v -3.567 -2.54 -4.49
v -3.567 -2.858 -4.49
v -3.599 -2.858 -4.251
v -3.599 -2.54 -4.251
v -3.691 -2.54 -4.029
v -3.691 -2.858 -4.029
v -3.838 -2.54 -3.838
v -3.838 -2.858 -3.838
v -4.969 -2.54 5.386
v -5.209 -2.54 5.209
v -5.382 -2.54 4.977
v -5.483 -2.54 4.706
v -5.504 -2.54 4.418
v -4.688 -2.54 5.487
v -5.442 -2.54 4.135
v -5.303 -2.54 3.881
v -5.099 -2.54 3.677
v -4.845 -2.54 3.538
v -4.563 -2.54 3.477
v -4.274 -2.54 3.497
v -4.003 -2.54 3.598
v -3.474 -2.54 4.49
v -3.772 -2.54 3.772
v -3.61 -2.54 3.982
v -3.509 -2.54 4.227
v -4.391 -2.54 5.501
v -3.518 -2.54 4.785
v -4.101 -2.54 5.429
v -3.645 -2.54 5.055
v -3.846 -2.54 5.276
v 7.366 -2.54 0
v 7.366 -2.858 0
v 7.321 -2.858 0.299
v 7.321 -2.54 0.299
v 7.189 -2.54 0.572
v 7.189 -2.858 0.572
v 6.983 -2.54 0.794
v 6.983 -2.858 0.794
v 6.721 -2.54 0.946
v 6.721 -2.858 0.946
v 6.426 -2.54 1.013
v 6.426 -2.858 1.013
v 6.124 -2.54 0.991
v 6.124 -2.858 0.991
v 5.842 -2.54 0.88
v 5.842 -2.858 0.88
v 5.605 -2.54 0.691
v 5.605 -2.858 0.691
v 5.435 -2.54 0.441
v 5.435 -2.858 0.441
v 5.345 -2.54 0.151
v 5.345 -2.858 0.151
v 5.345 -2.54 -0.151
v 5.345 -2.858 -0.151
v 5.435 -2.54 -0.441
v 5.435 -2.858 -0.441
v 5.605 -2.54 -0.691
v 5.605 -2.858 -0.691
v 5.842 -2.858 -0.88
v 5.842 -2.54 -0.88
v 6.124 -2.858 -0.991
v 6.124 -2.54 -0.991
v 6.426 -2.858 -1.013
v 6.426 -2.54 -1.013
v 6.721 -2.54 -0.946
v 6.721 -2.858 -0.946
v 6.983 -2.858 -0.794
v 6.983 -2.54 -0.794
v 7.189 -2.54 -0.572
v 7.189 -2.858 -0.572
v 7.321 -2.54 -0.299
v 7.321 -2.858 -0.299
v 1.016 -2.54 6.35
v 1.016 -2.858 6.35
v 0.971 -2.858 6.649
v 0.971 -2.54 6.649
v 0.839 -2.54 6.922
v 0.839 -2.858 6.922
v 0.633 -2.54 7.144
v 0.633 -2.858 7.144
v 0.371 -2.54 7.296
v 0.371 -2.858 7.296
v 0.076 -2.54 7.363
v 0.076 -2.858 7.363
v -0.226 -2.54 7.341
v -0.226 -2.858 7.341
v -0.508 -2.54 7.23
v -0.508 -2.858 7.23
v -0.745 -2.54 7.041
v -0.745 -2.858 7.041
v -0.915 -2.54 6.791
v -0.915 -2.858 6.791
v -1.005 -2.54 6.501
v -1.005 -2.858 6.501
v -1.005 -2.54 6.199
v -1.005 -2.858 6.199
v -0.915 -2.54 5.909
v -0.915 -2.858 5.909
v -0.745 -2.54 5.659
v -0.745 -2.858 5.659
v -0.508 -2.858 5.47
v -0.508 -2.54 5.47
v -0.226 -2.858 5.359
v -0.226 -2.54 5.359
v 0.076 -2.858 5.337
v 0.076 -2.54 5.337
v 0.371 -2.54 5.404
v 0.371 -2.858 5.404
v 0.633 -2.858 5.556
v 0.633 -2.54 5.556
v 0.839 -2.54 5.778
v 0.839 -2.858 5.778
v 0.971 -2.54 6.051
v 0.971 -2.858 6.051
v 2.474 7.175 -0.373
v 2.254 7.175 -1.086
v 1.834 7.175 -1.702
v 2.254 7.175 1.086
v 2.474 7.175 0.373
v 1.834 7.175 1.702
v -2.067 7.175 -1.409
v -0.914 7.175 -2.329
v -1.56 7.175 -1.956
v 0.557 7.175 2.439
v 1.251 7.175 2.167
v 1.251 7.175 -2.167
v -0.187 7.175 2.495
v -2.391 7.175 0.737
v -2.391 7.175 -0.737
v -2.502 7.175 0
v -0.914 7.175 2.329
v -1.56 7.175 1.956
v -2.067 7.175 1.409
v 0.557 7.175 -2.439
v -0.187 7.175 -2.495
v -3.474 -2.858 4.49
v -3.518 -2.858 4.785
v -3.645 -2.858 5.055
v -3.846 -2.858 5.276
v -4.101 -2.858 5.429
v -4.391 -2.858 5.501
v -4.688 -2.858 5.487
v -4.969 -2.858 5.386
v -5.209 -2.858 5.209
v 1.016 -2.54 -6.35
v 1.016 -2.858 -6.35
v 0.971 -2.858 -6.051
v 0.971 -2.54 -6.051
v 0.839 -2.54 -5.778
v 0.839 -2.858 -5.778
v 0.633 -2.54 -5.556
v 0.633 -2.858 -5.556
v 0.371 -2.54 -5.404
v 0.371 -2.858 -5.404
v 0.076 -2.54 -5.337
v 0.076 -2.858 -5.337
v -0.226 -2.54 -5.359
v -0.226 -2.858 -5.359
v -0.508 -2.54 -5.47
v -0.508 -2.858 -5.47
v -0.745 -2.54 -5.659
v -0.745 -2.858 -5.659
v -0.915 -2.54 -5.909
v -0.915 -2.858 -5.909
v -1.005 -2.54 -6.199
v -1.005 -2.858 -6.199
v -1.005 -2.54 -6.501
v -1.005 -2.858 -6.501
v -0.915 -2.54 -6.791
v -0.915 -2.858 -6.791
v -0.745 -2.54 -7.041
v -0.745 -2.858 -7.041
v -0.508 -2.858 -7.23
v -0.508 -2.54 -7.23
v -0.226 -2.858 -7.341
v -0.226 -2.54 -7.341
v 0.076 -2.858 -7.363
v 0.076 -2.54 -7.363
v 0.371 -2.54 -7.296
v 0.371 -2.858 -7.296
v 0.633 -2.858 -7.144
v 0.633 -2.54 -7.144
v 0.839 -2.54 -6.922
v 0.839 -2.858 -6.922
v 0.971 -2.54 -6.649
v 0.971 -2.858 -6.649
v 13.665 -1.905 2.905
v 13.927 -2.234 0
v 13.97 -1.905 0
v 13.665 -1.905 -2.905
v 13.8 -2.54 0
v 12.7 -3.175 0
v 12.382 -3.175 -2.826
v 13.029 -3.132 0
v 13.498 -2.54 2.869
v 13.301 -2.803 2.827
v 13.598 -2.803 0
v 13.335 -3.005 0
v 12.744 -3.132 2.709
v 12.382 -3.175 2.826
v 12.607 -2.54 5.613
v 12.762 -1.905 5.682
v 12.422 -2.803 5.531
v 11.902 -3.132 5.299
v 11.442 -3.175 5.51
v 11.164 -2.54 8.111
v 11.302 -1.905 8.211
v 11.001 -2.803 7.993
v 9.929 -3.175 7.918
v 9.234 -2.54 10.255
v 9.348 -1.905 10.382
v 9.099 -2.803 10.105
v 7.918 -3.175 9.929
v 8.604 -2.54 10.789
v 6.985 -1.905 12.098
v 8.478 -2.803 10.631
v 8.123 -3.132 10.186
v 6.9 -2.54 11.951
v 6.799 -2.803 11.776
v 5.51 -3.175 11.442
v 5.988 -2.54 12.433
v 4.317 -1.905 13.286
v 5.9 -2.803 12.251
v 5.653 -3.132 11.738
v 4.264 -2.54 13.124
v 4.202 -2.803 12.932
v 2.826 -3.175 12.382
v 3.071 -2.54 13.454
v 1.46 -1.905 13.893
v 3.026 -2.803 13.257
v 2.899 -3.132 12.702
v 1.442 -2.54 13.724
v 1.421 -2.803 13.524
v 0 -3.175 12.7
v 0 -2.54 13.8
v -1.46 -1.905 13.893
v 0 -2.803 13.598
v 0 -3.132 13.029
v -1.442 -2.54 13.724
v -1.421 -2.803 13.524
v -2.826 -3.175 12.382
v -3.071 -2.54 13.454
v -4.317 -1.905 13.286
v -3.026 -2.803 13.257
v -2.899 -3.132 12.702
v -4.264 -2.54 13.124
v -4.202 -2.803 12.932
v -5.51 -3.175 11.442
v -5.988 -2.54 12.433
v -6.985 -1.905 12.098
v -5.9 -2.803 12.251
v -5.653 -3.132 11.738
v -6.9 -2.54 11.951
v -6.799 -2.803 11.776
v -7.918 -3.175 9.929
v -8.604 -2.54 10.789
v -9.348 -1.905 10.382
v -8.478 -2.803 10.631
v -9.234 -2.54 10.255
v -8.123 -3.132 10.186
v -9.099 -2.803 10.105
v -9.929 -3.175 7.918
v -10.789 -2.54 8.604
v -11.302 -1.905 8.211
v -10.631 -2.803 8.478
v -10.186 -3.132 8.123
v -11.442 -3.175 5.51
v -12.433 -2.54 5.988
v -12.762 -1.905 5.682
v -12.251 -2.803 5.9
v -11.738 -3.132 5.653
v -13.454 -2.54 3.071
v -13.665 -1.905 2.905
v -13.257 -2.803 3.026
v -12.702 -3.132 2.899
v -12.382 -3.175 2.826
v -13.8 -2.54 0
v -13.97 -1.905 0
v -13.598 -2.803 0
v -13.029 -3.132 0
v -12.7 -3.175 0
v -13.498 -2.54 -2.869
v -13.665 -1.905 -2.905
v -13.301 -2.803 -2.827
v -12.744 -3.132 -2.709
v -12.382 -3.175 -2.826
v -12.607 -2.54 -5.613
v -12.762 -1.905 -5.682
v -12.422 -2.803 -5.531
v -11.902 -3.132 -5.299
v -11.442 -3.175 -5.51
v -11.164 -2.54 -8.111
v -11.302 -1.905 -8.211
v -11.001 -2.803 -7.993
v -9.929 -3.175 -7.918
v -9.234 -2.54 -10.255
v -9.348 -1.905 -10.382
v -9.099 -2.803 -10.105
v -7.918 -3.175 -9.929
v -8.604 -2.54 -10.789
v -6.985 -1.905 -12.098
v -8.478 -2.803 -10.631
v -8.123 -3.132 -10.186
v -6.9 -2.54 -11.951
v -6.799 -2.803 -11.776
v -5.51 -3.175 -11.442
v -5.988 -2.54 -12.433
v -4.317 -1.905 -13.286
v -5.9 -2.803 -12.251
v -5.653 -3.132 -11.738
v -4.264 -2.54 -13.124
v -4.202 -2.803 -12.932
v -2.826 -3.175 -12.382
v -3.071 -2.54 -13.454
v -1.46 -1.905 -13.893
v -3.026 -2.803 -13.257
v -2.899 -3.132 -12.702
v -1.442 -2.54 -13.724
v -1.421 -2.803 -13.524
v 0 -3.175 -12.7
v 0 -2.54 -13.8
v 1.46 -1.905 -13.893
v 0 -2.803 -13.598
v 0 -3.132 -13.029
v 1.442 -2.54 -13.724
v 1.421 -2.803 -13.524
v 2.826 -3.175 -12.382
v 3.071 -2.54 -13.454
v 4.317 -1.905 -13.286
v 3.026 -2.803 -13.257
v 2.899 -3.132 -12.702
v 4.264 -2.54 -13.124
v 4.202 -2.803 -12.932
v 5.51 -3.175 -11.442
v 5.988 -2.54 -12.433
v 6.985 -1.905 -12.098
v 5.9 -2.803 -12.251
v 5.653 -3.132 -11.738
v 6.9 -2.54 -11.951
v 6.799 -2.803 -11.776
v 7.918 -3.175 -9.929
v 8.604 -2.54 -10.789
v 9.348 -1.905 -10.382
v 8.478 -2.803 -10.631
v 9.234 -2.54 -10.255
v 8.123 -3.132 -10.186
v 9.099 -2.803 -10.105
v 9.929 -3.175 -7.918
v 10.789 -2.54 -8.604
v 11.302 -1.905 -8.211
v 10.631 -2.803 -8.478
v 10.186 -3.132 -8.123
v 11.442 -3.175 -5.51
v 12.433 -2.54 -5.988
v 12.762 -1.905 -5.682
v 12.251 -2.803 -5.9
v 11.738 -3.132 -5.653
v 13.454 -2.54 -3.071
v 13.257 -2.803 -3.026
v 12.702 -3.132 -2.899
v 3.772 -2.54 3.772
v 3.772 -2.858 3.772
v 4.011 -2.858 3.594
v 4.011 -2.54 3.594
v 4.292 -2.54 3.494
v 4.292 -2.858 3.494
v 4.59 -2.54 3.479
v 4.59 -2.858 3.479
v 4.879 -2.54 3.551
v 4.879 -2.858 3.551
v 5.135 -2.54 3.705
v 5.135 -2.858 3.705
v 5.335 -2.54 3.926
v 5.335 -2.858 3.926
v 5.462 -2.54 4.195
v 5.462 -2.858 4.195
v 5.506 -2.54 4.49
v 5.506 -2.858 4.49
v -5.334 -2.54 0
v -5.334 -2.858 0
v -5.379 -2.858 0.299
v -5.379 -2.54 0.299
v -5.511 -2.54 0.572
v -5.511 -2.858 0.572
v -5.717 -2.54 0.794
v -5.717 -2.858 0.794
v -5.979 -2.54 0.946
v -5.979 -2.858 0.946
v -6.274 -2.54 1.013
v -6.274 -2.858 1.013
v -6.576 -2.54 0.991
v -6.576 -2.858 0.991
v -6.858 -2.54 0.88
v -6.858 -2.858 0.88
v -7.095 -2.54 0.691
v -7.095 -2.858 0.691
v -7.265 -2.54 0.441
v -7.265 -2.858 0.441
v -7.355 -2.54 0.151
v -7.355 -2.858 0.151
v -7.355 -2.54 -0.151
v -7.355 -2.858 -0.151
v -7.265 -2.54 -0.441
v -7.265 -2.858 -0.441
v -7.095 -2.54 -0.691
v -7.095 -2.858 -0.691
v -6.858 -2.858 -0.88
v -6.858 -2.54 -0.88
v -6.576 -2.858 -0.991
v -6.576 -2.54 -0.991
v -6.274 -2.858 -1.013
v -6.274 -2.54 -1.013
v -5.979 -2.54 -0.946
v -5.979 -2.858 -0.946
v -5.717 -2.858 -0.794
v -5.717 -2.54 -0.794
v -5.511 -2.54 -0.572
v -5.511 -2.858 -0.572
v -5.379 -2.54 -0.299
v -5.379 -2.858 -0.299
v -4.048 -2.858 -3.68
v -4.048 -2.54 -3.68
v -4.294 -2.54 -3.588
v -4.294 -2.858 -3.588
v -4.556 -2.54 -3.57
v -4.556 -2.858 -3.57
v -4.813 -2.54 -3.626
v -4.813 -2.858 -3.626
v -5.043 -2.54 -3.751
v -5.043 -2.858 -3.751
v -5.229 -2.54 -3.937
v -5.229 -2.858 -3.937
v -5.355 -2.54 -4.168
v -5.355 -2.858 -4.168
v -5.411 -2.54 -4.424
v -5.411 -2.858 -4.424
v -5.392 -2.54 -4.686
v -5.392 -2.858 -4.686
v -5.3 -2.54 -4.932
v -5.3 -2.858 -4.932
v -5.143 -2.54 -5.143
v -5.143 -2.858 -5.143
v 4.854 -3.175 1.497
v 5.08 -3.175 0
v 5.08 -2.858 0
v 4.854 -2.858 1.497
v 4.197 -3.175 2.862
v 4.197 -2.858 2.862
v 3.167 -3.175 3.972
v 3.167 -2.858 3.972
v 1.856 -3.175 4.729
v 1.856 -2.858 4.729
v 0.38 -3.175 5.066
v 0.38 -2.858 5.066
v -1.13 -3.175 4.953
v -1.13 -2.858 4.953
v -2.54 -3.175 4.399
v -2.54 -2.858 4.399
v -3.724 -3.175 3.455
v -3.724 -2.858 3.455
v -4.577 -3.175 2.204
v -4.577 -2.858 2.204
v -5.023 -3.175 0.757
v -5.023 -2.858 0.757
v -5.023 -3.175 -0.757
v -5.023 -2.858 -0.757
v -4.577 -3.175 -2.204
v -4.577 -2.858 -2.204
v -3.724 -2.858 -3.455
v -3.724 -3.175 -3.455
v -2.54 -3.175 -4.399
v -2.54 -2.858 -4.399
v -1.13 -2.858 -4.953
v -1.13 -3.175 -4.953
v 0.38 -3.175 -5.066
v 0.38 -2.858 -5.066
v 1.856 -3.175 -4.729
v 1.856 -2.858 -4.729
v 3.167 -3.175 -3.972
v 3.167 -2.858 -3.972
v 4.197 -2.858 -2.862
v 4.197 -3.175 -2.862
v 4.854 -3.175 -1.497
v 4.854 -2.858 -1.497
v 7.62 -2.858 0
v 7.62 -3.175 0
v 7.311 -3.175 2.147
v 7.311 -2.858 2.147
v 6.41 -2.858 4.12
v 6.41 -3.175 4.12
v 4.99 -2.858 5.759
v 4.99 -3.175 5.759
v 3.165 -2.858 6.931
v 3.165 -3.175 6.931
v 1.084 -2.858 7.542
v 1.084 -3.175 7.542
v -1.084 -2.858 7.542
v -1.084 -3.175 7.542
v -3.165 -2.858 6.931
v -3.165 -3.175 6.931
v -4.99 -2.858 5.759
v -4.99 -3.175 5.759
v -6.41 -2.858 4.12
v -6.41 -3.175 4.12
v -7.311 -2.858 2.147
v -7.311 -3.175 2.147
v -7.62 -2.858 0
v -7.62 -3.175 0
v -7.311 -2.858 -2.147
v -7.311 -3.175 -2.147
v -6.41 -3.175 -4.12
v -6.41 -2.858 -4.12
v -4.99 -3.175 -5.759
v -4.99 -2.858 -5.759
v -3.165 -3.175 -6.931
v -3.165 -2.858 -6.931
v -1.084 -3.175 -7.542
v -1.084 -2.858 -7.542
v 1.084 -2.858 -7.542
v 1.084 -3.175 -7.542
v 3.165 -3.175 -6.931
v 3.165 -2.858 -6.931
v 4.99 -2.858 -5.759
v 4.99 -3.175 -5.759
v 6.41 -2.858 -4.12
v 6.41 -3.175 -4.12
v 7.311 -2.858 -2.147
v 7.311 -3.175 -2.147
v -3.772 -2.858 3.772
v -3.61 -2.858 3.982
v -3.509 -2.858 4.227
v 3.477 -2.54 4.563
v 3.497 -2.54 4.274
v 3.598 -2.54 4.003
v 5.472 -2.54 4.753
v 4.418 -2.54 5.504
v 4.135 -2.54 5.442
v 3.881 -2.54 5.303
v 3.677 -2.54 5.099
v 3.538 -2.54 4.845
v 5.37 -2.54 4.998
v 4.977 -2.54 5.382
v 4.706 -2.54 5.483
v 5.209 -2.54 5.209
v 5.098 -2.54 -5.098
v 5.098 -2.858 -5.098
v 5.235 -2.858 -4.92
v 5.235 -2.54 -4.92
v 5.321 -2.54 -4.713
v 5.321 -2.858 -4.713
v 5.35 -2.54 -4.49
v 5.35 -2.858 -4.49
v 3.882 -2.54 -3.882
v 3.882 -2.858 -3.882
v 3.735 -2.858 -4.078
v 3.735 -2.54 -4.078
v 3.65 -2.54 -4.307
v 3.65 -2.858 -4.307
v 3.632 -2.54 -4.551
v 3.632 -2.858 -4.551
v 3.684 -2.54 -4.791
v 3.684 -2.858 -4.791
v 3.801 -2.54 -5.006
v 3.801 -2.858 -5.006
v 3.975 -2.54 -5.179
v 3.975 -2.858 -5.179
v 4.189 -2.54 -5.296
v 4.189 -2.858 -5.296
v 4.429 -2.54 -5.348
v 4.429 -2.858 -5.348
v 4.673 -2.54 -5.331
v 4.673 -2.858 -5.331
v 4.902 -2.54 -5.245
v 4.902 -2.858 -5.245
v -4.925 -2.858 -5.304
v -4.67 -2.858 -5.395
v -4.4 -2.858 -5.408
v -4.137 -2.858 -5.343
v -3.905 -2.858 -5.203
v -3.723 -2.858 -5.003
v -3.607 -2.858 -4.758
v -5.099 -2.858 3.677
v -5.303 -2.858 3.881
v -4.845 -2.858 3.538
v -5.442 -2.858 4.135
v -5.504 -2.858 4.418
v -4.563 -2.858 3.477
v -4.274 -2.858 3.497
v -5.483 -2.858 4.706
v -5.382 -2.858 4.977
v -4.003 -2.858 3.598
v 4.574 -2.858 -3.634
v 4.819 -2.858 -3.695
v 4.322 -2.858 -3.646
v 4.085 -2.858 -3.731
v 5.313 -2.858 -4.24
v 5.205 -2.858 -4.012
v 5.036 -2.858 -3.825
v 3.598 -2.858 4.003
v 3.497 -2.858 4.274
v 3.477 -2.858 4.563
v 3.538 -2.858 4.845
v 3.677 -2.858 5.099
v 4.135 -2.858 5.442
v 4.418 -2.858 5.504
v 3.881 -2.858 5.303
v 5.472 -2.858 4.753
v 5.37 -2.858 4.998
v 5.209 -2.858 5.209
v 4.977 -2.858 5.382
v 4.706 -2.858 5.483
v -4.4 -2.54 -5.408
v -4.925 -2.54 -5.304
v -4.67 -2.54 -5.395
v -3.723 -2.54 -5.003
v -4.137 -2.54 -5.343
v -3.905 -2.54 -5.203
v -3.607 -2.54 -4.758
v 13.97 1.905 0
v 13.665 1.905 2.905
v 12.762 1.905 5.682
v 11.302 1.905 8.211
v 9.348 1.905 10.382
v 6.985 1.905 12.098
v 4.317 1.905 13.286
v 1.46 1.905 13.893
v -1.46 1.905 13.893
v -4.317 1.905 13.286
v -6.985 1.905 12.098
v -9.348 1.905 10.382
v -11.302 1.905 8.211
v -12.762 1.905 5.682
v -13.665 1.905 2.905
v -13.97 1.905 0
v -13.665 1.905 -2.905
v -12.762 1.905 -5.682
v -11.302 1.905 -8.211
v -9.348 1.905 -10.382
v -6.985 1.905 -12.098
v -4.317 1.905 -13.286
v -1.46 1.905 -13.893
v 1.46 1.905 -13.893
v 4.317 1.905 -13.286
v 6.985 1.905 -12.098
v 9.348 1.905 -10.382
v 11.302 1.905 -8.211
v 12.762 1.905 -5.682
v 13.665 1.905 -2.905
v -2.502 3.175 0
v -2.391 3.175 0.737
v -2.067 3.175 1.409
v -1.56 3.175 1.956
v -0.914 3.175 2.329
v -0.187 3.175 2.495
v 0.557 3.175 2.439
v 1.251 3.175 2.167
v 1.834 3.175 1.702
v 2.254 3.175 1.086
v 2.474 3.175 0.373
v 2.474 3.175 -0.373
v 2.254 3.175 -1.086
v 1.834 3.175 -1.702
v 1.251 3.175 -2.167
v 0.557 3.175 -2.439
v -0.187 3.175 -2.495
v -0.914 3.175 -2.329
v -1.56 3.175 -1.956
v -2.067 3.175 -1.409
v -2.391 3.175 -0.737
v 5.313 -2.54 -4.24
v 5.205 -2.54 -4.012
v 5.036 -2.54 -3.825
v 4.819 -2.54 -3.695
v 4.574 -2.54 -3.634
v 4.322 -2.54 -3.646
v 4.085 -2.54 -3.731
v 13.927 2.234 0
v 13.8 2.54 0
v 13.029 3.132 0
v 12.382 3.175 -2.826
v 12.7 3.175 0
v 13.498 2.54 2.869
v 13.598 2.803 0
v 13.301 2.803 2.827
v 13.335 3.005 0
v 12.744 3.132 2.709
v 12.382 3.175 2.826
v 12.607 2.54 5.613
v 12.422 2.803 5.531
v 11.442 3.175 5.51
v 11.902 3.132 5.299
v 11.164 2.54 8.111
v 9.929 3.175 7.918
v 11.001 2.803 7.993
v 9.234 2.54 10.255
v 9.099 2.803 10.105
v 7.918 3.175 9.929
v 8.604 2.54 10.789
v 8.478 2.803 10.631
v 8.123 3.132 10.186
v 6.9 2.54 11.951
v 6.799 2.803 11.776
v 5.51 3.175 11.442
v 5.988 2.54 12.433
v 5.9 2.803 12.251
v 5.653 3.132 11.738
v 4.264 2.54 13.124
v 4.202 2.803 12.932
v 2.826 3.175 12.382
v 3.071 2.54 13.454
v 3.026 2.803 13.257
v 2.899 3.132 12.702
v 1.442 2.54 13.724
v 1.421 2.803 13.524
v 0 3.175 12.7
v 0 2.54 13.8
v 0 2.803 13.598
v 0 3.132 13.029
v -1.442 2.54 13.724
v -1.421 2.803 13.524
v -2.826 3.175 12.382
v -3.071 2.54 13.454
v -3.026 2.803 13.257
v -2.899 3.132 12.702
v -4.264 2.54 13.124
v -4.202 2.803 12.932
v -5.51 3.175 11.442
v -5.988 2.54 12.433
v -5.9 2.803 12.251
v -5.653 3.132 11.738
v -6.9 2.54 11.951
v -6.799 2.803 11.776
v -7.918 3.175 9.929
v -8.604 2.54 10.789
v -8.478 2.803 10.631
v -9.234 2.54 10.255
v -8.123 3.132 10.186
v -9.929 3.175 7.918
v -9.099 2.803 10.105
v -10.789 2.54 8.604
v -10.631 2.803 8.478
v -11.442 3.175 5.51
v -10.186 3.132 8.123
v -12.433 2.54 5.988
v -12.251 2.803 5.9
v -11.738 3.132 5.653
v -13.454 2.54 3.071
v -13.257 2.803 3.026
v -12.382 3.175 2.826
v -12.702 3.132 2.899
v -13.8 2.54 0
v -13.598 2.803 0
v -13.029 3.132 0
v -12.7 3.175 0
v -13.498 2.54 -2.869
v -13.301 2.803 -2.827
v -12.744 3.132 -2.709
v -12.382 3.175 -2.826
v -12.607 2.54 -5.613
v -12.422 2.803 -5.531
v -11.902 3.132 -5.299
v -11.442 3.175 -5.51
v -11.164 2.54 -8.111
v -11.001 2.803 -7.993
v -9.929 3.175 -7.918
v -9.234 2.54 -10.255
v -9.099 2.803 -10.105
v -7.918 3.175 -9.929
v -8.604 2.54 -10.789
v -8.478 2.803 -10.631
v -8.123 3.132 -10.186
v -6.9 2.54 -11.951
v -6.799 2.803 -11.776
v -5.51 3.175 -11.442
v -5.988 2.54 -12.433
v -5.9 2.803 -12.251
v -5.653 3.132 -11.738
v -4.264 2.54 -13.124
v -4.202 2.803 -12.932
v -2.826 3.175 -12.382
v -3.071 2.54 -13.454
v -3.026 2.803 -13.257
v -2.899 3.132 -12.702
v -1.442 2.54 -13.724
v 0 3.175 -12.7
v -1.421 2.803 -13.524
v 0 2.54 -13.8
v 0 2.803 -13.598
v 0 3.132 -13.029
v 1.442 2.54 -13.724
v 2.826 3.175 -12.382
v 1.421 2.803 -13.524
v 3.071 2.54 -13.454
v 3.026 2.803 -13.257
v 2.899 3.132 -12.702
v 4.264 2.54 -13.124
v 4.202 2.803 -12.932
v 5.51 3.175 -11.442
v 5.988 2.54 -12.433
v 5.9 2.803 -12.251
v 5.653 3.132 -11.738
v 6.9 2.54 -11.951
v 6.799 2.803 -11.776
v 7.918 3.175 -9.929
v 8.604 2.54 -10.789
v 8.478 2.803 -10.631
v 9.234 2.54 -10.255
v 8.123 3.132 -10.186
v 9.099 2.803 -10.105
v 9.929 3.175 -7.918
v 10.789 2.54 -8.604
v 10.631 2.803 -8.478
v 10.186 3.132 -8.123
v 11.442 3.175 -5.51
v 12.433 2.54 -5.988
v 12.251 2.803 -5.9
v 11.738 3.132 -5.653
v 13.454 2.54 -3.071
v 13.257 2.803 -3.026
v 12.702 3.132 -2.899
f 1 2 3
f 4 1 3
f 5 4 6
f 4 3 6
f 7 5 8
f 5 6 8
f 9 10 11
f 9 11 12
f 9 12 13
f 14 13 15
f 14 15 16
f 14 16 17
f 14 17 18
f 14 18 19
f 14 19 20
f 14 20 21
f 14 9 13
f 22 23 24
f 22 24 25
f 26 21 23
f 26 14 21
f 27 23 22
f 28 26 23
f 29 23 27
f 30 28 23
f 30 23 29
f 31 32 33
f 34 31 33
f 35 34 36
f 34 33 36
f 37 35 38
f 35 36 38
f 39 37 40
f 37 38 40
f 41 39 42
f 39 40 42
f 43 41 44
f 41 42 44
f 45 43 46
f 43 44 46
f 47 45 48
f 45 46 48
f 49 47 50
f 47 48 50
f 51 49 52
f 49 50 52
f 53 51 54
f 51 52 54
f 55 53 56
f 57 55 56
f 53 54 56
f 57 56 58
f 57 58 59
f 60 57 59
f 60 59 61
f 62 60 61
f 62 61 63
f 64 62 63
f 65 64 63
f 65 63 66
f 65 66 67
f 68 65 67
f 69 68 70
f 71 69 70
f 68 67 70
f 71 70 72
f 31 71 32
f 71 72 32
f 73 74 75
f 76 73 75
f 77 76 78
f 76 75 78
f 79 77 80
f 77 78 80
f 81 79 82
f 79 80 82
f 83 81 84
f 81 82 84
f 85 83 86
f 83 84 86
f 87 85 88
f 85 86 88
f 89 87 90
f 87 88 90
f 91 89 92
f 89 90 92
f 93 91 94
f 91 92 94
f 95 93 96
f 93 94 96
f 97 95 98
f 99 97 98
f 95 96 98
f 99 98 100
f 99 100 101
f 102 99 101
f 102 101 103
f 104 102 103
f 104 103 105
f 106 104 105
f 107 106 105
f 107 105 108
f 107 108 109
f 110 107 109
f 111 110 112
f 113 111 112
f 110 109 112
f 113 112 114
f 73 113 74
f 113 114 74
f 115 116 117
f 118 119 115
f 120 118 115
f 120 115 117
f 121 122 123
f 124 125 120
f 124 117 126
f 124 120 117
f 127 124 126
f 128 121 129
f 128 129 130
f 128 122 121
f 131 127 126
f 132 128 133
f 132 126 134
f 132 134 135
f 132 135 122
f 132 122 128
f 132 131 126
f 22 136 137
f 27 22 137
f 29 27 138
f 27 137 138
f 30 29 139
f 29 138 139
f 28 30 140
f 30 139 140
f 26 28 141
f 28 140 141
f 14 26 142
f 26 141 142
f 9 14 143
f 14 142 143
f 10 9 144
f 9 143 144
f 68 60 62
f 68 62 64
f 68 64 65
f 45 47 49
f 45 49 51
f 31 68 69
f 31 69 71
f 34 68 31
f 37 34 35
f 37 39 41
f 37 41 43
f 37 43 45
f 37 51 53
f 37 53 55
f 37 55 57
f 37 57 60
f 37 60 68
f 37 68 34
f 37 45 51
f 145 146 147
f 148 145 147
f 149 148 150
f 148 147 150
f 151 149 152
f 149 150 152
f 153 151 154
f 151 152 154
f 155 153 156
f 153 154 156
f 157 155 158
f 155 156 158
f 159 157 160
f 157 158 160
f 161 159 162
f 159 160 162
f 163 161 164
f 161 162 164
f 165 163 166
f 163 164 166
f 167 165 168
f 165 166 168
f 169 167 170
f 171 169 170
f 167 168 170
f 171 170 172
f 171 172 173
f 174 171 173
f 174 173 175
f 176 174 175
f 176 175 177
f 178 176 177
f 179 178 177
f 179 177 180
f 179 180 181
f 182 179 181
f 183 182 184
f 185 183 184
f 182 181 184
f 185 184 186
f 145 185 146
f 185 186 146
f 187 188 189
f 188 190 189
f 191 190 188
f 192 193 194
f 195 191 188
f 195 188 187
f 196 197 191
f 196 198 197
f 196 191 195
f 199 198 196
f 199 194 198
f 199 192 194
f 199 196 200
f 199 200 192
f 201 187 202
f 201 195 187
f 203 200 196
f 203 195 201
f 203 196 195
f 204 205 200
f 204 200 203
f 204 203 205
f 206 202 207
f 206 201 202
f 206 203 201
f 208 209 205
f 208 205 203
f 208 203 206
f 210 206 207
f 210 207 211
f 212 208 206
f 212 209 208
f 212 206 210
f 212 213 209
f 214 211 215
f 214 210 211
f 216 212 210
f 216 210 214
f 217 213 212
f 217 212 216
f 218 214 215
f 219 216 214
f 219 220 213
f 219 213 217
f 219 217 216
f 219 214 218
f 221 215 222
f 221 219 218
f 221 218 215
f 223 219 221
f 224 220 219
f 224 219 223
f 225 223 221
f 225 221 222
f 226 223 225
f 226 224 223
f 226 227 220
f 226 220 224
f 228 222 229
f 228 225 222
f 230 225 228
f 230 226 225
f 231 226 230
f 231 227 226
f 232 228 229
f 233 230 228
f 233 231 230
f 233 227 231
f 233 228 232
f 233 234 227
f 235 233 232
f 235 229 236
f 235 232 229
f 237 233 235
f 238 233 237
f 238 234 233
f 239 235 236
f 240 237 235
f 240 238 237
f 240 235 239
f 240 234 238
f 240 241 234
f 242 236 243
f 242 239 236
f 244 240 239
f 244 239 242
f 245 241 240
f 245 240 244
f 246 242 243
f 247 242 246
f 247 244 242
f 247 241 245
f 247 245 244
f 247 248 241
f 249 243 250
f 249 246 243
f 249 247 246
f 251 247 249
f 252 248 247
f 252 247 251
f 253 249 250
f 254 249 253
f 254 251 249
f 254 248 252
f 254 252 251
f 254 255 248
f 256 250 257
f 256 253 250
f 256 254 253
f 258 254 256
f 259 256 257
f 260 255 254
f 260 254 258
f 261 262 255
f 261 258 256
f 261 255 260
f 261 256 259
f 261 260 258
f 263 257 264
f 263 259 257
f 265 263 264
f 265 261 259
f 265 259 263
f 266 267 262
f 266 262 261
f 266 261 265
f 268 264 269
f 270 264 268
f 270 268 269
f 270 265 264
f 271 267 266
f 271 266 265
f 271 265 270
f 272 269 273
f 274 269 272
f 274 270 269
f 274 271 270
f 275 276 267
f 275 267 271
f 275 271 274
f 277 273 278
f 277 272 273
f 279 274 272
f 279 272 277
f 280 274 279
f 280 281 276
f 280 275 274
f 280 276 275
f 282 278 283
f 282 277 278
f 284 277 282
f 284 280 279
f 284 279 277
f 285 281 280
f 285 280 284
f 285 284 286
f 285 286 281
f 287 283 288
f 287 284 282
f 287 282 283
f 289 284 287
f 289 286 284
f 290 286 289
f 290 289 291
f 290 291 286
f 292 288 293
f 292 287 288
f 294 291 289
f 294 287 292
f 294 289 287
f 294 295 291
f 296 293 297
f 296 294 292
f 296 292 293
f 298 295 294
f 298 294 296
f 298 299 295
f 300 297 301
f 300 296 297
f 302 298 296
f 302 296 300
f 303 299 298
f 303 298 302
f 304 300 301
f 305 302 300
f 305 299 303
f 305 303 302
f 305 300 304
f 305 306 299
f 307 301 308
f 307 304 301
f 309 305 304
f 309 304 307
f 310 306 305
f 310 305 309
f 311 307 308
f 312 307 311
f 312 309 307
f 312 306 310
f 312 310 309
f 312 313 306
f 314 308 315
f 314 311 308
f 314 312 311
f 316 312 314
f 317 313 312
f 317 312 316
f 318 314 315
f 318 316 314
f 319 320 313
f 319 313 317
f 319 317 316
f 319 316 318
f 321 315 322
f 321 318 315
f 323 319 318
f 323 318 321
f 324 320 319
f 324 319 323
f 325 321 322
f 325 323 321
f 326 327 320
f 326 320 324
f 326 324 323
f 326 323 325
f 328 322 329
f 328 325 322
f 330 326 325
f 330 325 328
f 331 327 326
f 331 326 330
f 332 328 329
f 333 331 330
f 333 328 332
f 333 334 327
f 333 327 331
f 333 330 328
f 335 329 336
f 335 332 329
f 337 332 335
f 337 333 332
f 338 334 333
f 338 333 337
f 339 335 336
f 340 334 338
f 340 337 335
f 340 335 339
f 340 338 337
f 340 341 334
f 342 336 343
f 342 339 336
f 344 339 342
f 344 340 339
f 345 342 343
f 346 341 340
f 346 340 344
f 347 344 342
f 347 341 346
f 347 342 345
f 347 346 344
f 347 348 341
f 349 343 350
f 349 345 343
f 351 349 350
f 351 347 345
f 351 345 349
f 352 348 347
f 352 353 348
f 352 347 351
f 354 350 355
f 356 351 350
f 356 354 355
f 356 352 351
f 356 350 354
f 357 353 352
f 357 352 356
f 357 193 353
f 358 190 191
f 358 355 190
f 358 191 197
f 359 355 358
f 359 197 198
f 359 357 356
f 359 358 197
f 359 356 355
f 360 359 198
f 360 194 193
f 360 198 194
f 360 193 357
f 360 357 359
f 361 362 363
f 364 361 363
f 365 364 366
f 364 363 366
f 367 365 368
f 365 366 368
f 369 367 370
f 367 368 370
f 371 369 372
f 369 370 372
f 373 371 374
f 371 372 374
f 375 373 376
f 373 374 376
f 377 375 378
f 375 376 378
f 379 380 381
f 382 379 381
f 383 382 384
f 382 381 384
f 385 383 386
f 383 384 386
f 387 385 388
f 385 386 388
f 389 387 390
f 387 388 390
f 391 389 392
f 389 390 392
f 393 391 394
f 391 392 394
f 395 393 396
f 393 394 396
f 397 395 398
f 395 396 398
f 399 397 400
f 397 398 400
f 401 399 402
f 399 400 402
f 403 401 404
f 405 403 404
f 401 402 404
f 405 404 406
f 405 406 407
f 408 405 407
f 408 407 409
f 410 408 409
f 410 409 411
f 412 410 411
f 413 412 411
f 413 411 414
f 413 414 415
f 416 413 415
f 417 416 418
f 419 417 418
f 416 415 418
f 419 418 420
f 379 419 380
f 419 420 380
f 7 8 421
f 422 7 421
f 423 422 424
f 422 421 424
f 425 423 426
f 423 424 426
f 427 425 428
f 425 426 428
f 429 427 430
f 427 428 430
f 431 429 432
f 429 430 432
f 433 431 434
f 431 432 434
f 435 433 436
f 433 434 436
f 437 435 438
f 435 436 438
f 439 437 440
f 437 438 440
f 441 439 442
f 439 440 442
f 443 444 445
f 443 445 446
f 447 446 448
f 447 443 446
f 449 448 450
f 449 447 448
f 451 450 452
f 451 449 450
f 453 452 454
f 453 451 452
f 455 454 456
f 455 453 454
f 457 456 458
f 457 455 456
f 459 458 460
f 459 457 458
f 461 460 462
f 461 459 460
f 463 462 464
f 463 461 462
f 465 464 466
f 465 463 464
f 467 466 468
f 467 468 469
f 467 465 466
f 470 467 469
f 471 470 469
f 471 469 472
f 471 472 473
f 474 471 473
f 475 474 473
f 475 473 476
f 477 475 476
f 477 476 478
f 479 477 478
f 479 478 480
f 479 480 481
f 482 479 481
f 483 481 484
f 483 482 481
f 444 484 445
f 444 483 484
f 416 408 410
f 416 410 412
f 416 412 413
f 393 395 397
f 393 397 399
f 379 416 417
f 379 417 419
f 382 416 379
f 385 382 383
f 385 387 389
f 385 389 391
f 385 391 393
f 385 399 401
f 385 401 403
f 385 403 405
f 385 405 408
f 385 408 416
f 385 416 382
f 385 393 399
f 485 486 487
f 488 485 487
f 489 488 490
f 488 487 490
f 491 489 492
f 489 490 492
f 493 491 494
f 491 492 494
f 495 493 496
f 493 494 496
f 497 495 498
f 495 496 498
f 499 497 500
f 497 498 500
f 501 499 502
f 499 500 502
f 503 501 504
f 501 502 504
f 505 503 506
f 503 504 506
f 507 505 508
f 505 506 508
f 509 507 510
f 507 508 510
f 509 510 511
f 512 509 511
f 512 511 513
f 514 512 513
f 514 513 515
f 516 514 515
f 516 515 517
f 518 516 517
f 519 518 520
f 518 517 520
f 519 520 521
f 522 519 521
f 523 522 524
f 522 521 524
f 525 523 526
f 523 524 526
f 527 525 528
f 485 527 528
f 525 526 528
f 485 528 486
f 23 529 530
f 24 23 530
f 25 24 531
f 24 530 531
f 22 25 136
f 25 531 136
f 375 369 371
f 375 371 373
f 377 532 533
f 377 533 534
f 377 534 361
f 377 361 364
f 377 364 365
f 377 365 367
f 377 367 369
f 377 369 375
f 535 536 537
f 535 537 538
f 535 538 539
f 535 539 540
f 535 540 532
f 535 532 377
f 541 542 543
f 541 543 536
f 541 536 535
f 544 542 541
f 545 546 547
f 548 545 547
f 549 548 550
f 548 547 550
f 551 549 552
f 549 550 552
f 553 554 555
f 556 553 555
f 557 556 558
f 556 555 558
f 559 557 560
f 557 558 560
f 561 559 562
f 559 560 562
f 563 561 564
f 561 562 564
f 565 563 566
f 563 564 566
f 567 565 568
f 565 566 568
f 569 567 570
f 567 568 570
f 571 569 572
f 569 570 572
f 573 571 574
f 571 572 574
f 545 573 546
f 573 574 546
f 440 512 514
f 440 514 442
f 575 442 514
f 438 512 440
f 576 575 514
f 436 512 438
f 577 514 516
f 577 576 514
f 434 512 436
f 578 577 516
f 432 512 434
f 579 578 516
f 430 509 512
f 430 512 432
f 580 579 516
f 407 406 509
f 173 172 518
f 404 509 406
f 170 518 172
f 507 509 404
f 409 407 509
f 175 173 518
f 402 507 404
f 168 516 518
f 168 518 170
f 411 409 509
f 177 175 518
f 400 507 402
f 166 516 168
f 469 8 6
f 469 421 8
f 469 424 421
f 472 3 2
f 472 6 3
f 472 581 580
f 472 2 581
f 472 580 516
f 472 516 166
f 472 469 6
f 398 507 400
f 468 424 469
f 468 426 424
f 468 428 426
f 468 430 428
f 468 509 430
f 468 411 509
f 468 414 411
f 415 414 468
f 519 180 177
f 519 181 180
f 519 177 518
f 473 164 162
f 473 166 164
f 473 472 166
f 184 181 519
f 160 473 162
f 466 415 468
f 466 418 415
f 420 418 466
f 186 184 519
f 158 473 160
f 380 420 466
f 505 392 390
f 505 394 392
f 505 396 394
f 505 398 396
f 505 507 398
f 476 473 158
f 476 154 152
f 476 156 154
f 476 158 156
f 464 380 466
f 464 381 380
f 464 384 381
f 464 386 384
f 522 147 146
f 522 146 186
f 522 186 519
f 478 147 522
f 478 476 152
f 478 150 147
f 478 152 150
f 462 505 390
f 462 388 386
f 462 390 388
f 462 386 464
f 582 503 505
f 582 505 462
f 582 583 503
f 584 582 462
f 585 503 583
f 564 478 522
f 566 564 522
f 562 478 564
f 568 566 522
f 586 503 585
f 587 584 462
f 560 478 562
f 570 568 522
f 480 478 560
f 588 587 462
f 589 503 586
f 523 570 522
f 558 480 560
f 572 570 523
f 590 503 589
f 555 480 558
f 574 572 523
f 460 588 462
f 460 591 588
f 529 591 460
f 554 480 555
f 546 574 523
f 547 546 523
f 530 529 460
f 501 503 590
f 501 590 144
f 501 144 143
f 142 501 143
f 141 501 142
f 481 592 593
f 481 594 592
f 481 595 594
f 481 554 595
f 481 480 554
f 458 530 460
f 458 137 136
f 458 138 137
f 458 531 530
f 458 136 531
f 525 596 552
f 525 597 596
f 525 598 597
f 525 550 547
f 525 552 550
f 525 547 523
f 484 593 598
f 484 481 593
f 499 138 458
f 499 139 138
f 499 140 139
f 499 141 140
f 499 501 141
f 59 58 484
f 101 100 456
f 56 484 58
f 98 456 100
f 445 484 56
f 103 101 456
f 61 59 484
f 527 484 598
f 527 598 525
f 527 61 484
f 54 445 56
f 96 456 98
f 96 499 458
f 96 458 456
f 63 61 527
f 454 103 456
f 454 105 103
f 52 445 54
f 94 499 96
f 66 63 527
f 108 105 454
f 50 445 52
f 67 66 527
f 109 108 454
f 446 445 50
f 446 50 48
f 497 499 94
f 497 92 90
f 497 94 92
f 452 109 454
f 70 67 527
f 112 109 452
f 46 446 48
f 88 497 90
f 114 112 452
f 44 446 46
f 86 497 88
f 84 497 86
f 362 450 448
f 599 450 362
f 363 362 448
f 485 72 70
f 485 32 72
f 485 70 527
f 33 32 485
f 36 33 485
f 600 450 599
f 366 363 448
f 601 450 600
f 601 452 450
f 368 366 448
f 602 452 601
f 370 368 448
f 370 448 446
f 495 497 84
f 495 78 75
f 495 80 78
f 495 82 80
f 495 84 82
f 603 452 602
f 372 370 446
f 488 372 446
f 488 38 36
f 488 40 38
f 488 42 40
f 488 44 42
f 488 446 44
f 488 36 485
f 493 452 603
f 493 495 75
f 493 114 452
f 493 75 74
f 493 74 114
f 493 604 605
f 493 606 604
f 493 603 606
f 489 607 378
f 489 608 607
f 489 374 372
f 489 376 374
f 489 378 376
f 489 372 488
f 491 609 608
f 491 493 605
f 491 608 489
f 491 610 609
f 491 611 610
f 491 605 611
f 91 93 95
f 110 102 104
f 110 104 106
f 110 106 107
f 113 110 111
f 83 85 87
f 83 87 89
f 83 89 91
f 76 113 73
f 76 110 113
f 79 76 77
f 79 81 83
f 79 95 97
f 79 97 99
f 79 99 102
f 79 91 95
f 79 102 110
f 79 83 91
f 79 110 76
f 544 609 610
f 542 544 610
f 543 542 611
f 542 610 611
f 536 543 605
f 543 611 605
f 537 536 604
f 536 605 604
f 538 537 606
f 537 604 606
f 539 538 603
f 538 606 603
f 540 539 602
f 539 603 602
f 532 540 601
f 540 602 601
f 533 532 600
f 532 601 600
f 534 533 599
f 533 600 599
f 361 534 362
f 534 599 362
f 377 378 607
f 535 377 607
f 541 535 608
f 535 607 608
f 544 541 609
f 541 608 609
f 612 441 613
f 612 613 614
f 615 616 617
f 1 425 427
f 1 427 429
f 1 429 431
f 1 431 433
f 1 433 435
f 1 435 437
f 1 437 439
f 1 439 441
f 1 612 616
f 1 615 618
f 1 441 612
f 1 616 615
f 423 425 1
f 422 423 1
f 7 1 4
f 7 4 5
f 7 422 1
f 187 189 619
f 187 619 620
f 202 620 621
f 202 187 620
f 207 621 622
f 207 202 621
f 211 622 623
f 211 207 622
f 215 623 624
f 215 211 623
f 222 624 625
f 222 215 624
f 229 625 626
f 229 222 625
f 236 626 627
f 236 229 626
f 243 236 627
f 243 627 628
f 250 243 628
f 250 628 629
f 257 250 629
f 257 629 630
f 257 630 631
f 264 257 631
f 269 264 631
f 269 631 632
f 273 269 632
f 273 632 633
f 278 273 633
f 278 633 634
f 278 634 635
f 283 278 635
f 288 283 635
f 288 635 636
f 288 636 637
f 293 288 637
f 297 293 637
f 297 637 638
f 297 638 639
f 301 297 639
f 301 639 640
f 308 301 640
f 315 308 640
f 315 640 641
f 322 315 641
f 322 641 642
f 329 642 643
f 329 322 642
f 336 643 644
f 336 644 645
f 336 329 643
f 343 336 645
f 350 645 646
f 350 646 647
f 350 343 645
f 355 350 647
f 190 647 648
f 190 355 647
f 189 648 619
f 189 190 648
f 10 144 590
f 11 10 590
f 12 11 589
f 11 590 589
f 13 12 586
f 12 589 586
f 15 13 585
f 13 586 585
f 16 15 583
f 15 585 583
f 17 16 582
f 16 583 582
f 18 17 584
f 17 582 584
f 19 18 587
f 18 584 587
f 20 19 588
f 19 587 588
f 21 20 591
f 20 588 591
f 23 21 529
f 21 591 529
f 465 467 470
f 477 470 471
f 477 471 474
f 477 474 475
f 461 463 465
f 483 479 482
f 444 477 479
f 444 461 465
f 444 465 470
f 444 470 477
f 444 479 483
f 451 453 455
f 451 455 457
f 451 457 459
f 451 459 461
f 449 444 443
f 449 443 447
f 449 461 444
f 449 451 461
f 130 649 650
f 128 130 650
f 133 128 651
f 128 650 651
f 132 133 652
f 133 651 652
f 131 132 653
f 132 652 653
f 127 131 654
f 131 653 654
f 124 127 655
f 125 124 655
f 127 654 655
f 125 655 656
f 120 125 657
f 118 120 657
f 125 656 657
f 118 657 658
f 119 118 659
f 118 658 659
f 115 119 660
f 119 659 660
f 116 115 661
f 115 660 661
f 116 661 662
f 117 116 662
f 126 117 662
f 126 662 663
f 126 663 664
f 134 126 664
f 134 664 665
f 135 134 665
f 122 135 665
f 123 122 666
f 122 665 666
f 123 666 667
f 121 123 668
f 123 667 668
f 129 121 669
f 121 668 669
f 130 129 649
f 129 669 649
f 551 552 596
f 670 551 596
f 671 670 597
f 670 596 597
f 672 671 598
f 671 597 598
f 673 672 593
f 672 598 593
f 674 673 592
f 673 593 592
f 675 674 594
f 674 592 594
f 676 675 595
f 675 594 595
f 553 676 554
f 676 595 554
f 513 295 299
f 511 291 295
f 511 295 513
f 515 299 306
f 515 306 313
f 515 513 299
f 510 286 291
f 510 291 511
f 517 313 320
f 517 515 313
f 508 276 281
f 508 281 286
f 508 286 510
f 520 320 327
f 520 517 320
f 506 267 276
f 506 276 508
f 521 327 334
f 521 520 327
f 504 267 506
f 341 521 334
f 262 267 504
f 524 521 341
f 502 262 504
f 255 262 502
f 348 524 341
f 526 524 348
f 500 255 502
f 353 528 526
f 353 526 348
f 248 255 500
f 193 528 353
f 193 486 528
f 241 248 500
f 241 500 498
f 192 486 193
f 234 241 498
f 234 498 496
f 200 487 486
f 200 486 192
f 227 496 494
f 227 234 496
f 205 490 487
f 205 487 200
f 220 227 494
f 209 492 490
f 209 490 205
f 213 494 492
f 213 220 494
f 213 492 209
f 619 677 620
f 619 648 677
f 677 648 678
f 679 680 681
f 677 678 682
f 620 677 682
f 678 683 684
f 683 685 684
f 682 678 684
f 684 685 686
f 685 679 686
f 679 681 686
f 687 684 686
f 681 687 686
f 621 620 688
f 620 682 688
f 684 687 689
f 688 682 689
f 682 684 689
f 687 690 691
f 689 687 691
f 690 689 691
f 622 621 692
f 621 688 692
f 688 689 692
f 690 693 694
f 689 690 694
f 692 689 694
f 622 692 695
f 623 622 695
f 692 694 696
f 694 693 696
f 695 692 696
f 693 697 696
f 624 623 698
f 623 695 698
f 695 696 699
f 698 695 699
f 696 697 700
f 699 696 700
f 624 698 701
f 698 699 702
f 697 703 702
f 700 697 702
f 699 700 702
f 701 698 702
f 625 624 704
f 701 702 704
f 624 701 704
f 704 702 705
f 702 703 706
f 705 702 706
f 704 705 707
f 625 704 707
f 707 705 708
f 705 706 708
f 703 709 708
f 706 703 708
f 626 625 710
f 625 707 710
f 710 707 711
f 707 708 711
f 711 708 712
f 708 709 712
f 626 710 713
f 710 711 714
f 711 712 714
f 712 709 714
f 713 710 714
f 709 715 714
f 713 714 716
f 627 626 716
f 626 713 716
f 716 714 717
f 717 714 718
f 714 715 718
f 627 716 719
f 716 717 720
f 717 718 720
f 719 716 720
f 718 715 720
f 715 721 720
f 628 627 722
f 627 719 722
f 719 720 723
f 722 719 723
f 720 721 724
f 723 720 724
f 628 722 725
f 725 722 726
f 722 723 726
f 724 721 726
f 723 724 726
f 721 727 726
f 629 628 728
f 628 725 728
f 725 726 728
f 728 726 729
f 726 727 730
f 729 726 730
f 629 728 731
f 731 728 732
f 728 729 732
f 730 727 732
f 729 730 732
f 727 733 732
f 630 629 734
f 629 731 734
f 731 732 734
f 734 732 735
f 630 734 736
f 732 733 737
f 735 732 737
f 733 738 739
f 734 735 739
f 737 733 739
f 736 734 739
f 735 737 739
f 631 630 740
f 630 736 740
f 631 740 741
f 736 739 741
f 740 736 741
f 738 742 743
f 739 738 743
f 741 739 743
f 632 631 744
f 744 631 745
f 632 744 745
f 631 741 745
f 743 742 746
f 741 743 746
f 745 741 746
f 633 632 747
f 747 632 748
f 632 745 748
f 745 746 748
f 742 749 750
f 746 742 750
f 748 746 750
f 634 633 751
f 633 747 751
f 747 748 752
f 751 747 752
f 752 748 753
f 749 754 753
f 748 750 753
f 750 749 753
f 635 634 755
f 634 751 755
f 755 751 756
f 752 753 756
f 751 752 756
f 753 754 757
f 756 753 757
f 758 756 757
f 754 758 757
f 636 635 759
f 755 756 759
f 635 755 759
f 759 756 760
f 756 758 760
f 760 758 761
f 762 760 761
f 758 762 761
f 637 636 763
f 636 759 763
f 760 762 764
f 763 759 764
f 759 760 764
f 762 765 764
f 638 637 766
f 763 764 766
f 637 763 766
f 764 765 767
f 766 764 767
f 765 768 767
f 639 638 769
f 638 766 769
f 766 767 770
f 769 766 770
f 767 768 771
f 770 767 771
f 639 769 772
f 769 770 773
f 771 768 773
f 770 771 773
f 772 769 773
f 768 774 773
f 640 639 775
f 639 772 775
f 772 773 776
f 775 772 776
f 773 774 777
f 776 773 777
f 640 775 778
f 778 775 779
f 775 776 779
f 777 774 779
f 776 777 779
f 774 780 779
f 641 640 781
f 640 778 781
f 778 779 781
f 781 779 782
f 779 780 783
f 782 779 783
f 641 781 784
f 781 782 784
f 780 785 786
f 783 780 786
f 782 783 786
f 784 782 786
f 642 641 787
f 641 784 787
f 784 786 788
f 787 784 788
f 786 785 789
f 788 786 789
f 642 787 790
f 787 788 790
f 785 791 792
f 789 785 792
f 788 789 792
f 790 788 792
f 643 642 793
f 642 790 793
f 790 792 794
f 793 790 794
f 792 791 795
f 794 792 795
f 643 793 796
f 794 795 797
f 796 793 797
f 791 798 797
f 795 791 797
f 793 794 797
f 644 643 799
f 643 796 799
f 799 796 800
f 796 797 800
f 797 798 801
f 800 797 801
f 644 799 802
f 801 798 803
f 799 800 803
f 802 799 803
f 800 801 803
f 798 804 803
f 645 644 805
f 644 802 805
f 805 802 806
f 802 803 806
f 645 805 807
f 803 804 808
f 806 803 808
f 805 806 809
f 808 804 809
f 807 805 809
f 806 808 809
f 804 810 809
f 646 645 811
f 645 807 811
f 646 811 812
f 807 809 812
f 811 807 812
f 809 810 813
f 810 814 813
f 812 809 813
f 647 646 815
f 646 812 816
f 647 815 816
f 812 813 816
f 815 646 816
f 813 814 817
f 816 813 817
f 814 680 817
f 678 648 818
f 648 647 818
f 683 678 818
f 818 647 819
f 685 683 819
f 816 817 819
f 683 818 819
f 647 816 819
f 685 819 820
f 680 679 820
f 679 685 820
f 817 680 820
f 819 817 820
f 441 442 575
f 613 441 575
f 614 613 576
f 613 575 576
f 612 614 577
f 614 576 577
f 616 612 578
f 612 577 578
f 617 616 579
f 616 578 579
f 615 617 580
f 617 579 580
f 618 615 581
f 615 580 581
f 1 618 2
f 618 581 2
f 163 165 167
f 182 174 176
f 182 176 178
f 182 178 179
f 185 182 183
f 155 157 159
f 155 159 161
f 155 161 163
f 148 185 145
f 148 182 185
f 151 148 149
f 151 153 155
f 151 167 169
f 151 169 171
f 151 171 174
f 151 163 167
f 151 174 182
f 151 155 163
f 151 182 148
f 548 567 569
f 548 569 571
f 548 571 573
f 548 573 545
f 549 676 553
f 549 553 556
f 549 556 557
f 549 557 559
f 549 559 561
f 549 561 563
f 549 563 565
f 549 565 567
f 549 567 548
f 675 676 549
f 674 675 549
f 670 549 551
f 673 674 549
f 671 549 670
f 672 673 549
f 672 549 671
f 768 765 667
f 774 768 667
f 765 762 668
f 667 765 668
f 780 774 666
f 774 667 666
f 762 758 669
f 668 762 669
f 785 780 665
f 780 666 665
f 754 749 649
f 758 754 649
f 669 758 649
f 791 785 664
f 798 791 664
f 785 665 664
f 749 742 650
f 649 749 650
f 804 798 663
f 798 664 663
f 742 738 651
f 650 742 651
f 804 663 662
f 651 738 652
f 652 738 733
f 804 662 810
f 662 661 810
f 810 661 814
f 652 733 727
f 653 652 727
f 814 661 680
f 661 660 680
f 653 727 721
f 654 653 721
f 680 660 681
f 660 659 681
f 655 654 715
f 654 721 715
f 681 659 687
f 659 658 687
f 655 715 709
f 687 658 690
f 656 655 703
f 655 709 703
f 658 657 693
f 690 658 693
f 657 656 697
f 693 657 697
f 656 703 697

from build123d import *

# Parameters (mm, degrees)
F0_R     = 13.97
F1_DEPTH = 3.175
F2_R     = 1.27
F3_R     = 7.62
F3_R_2   = 5.08
F4_DEPTH = 0.3175
F5_R     = 2.5019
F6_DEPTH = 4
F7_R     = 1.016
F8_DEPTH = 0.3175


with BuildPart() as f1:
    # F0 (on Front) → F1 (new body, symmetric)
    with BuildSketch(Plane.XZ):
        Circle(F0_R)
    extrude(amount=F1_DEPTH, both=True)

    # F2
    f2_edges = [f1.edges().sort_by_distance(p)[0] for p in [
        (-13.97, -3.175, 0),
        (-13.97, 3.175, 0),
    ]]
    fillet(f2_edges, radius=F2_R)

    # F3 (on face) → F4 (cut)
    with BuildSketch(Plane.XZ.offset(3.175)):
        Circle(F3_R)
        Circle(F3_R_2, mode=Mode.SUBTRACT)
    extrude(amount=-F4_DEPTH, mode=Mode.SUBTRACT)

    # F5 (on face) → F6 (join)
    with BuildSketch(Plane(origin=(0, 3.175, 0), x_dir=(-1, 0, 0), z_dir=(0, 1, 0))):
        Circle(F5_R)
    extrude(amount=F6_DEPTH)

    # F7 (on face) → F8 (cut)
    with BuildSketch(Plane.XZ.offset(2.8575)):
        with Locations((0, 6.35)):
            Circle(F7_R)
        with Locations((0, -6.35)):
            Circle(F7_R)
        with Locations((-6.35, 0)):
            Circle(F7_R)
        with Locations((6.35, 0)):
            Circle(F7_R)
        with BuildLine():
            ThreePointArc((-5.208549, 5.208549), (-5.208549, 3.771708), (-3.771708, 3.771708))
            Line((-3.771708, 3.771708), (-5.208549, 5.208549))
        make_face()
        with BuildLine():
            Line((-5.208549, 5.208549), (-3.771708, 3.771708))
            ThreePointArc((-3.771708, 3.771708), (-3.551466, 4.101322), (-3.474128, 4.490128))
            ThreePointArc((-3.474128, 4.490128), (-4.101322, 5.42879), (-5.208549, 5.208549))
        make_face()
        with BuildLine():
            ThreePointArc((5.350396, -4.490128), (4.819338, -3.695344), (3.881827, -3.881827))
            Line((3.881827, -3.881827), (5.09843, -5.09843))
            ThreePointArc((5.09843, -5.09843), (5.284912, -4.819338), (5.350396, -4.490128))
        make_face()
        with BuildLine():
            Line((5.09843, -5.09843), (3.881827, -3.881827))
            ThreePointArc((3.881827, -3.881827), (3.881827, -5.09843), (5.09843, -5.09843))
        make_face()
        with BuildLine():
            ThreePointArc((-3.567395, -4.490128), (-3.637633, -4.137013), (-3.837657, -3.837657))
            Line((-3.837657, -3.837657), (-5.142599, -5.142599))
            ThreePointArc((-5.142599, -5.142599), (-4.137013, -5.342623), (-3.567395, -4.490128))
        make_face()
        with BuildLine():
            Line((-5.142599, -5.142599), (-3.837657, -3.837657))
            ThreePointArc((-3.837657, -3.837657), (-5.142599, -3.837657), (-5.142599, -5.142599))
        make_face()
        with BuildLine():
            ThreePointArc((5.208549, 5.208549), (3.771708, 5.208549), (3.771708, 3.771708))
            Line((3.771708, 3.771708), (5.208549, 5.208549))
        make_face()
        with BuildLine():
            Line((5.208549, 5.208549), (3.771708, 3.771708))
            ThreePointArc((3.771708, 3.771708), (4.878934, 3.551466), (5.506128, 4.490128))
            ThreePointArc((5.506128, 4.490128), (5.42879, 4.878934), (5.208549, 5.208549))
        make_face()
    extrude(amount=-F8_DEPTH, mode=Mode.SUBTRACT)


solid = f1.part
